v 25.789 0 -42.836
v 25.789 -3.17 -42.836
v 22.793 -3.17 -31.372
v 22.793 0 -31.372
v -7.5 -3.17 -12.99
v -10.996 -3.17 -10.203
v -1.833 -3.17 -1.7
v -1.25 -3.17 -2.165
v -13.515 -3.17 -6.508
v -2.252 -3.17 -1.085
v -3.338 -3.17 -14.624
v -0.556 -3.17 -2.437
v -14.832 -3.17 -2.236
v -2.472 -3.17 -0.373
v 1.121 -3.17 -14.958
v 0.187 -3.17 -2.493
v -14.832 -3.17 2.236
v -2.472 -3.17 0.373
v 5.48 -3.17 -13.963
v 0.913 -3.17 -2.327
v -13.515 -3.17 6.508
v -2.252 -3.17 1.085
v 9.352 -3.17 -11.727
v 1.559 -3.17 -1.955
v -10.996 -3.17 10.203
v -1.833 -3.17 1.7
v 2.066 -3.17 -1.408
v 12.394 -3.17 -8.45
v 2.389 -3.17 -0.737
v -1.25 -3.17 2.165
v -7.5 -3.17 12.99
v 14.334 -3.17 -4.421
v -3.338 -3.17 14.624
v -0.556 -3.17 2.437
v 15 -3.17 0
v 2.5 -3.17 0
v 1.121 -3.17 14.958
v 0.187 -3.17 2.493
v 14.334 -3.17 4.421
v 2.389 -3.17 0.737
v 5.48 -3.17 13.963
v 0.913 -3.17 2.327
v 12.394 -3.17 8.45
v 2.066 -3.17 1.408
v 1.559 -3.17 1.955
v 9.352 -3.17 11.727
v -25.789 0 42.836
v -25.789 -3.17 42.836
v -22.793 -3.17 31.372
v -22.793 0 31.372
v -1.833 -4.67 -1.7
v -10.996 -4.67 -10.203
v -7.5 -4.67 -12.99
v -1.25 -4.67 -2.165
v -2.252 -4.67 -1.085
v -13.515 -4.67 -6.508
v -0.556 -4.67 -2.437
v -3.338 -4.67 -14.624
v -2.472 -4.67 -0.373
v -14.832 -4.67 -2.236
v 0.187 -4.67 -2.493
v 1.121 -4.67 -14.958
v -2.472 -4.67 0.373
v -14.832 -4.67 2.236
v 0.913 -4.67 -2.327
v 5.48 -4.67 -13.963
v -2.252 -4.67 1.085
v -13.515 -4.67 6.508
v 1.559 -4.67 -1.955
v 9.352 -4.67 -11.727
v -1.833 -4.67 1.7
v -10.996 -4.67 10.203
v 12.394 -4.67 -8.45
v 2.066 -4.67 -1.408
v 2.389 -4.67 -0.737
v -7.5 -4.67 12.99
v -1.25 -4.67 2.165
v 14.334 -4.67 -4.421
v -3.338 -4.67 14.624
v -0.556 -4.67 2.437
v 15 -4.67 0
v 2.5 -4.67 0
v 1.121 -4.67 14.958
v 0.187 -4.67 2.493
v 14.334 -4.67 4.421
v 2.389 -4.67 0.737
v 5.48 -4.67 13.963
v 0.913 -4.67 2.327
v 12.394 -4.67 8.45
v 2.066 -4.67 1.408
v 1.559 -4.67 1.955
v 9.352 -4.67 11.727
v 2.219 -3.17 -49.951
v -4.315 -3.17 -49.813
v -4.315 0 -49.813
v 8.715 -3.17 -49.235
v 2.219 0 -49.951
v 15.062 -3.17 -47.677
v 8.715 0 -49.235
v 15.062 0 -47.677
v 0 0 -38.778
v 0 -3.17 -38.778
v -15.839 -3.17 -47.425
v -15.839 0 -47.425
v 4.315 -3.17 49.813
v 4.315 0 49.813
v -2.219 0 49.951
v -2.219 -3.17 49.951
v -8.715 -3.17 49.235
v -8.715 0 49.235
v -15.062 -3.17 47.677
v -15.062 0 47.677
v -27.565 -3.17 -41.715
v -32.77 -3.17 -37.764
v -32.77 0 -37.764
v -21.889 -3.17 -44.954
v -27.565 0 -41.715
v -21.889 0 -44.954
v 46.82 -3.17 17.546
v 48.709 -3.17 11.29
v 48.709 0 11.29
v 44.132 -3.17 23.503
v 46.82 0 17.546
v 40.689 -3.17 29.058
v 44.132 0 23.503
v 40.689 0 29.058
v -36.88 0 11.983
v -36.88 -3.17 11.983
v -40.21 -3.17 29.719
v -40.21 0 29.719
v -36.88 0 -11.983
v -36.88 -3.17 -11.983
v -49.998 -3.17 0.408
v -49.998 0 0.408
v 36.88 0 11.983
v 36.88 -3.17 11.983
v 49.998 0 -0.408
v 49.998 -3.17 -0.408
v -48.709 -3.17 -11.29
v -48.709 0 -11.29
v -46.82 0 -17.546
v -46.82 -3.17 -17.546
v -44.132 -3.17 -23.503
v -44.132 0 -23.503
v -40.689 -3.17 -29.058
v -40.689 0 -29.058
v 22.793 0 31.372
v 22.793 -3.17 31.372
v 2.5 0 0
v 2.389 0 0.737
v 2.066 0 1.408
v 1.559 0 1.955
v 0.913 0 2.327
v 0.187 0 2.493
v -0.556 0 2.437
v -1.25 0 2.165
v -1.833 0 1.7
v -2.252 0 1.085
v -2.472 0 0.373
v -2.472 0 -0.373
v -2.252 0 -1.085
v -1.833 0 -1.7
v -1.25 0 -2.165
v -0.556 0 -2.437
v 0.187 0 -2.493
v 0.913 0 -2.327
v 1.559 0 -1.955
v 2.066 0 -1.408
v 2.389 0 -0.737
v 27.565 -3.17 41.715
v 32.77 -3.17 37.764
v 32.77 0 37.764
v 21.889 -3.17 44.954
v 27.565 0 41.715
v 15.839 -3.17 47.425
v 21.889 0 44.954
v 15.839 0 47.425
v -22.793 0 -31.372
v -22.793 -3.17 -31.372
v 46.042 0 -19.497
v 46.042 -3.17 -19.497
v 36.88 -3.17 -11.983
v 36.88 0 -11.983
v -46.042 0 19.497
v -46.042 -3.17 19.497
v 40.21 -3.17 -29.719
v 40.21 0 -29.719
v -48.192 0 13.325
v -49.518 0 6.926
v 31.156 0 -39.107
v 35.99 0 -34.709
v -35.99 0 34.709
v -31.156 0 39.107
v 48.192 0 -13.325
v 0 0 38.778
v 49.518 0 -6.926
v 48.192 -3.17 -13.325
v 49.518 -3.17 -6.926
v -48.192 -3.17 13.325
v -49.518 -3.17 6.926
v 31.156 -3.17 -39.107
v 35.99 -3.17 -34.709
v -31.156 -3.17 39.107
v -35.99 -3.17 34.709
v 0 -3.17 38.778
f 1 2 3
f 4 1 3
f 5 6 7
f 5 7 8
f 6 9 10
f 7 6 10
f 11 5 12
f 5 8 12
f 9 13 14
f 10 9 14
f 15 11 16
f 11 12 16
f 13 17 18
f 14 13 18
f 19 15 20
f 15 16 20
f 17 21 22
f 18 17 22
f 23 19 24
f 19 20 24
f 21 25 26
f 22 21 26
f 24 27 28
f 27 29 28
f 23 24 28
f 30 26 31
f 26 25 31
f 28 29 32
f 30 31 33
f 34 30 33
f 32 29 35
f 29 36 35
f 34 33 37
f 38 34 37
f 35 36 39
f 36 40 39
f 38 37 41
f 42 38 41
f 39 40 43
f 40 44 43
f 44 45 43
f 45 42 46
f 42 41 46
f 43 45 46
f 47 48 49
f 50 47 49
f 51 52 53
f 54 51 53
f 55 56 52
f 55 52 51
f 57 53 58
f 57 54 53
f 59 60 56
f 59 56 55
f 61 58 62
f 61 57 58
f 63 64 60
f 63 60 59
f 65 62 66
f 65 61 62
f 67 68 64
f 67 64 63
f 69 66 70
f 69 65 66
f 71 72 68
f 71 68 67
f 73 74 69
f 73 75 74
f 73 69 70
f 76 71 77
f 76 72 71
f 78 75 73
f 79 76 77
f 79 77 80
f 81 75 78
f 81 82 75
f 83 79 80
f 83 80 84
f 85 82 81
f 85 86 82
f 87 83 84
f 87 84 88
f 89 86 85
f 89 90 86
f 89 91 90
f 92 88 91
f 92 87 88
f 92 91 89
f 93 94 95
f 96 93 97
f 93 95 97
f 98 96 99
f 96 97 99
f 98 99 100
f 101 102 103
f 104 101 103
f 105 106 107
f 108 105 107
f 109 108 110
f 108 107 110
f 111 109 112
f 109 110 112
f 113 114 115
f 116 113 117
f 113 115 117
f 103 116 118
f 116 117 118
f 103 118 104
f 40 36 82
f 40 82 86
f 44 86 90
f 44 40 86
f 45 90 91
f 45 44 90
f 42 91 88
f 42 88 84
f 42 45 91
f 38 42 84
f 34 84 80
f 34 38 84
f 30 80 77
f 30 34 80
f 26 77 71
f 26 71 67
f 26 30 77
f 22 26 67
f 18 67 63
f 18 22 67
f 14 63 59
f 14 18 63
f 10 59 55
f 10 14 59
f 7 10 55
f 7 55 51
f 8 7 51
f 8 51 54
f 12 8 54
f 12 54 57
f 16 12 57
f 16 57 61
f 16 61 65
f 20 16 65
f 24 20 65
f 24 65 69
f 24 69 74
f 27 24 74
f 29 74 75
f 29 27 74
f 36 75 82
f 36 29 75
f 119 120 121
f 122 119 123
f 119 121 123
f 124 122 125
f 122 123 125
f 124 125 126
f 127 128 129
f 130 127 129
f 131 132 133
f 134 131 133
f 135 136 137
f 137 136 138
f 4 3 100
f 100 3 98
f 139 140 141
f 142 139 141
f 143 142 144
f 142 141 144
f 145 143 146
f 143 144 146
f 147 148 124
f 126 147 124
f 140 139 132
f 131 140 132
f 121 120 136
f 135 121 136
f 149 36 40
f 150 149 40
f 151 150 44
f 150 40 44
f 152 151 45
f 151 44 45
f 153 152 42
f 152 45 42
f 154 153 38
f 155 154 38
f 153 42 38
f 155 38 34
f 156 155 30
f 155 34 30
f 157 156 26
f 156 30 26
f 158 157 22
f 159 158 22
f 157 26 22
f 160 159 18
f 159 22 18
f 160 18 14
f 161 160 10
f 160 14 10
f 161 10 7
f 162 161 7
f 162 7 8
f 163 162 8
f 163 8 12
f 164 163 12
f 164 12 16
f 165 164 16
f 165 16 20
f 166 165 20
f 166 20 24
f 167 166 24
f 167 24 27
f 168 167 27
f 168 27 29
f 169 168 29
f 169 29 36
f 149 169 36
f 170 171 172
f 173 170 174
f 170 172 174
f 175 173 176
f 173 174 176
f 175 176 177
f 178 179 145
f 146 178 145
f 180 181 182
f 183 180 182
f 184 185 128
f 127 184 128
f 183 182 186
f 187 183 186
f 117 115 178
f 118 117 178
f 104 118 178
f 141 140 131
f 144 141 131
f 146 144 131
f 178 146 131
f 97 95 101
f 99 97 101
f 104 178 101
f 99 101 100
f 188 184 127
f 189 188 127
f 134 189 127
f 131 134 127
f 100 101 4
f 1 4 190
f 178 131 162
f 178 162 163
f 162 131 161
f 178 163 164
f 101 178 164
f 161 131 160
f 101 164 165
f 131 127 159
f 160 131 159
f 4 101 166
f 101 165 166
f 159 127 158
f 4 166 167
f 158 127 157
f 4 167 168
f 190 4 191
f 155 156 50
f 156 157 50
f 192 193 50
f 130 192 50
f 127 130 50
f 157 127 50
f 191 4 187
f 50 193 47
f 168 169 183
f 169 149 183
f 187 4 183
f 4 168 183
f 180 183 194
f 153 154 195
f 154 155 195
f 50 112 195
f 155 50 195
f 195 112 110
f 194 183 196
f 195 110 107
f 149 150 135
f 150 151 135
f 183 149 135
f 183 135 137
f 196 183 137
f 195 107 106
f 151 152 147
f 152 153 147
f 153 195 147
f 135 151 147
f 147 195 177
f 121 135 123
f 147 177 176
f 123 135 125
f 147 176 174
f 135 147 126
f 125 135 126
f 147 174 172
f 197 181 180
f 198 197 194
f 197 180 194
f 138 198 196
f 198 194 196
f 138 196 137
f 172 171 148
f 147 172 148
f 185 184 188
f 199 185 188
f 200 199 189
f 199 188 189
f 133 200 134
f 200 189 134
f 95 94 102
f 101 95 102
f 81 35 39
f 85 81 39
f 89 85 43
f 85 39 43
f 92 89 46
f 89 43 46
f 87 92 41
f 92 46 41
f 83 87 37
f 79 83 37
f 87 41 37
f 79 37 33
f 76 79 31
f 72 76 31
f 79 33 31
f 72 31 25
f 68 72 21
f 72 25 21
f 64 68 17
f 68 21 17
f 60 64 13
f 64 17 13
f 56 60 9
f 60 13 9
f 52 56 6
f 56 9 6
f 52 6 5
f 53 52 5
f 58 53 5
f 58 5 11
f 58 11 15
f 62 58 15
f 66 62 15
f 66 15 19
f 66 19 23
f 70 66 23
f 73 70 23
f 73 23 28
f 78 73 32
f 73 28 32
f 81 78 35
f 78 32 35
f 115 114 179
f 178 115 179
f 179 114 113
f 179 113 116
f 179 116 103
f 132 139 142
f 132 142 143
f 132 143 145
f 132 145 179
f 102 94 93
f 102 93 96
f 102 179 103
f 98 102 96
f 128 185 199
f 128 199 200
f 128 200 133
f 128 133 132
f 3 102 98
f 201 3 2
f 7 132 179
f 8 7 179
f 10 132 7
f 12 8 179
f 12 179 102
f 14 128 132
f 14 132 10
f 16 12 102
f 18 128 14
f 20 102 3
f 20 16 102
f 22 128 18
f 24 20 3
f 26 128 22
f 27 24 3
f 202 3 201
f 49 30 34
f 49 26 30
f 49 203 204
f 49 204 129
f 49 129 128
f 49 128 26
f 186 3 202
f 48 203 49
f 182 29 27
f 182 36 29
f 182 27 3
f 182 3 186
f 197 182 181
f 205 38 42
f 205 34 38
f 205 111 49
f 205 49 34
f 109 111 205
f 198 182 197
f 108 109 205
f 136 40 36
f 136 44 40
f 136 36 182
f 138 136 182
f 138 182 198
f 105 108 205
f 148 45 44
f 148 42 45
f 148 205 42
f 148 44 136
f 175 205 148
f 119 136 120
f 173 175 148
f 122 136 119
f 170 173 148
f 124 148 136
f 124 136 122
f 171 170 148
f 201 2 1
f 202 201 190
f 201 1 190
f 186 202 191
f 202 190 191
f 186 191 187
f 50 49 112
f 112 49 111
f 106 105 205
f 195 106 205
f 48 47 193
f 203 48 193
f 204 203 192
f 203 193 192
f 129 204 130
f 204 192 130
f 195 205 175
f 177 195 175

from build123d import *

# Parameters (mm, degrees)
F0_R     = 50
F1_DEPTH = 3.17
F2_R     = 2.5
F3_DEPTH = 25
F4_R     = 15
F4_R_2   = 2.5
F5_DEPTH = 1.5
F7_DEPTH = 25


with BuildPart() as f1:
    # F0 (on Front) → F1 (new body)
    with BuildSketch(Plane.XZ):
        Circle(F0_R)
    extrude(amount=F1_DEPTH)

    # F2 (on face) → F3 (cut)
    with BuildSketch(Plane.XZ.offset(3.17)):
        Circle(F2_R)
    extrude(amount=-F3_DEPTH, mode=Mode.SUBTRACT)

    # F6 (on face) → F7 (cut)
    with BuildSketch(Plane.XZ.offset(3.17)):
        with BuildLine():
            Line((-22.7931910082, 31.3721360136), (-15.0621287485, 47.6773769996))
            ThreePointArc((-15.0621287485, 47.6773769996), (-20.5685569707, 45.5733964517), (-25.7891029355, 42.8359915233))
            Line((-25.7891029355, 42.8359915233), (-22.7931910082, 31.3721360136))
        make_face()
        with BuildLine():
            Line((0, 38.7780927122), (15.8385409393, 47.4251053864))
            ThreePointArc((15.8385409393, 47.4251053864), (10.1470581921, 48.9595466691), (4.3145415402, 49.8134994886))
            Line((4.3145415402, 49.8134994886), (0, 38.7780927122))
        make_face()
        with BuildLine():
            ThreePointArc((40.6894263206, 29.0580554357), (36.9868420114, 33.6448141327), (32.7701777935, 37.7639437478))
            Line((32.7701777935, 37.7639437478), (22.7931910082, 31.3721360136))
            Line((22.7931910082, 31.3721360136), (40.6894263206, 29.0580554357))
        make_face()
        with BuildLine():
            ThreePointArc((50, 0), (49.6761310759, 5.6817252069), (48.7087199469, 11.2898450446))
            Line((48.7087199469, 11.2898450446), (36.8801577634, 11.9830896575))
            Line((36.8801577634, 11.9830896575), (49.9983338301, -0.4081840445))
            ThreePointArc((49.9983338301, -0.4081840445), (49.9995834558, -0.2040937225), (50, 0))
        make_face()
        with BuildLine():
            ThreePointArc((40.2095771974, -29.7185110934), (43.4276824703, -24.7797577725), (46.0421866292, -19.4965907379))
            Line((46.0421866292, -19.4965907379), (36.8801577634, -11.9830896575))
            Line((36.8801577634, -11.9830896575), (40.2095771974, -29.7185110934))
        make_face()
        with BuildLine():
            ThreePointArc((15.0621287485, -47.6773769996), (20.5685569707, -45.5733964517), (25.7891029355, -42.8359915233))
            Line((25.7891029355, -42.8359915233), (22.7931910082, -31.3721360136))
            Line((22.7931910082, -31.3721360136), (15.0621287485, -47.6773769996))
        make_face()
        with BuildLine():
            ThreePointArc((-15.8385409393, -47.4251053864), (-10.1470581921, -48.9595466691), (-4.3145415402, -49.8134994886))
            Line((-4.3145415402, -49.8134994886), (0, -38.7780927122))
            Line((0, -38.7780927122), (-15.8385409393, -47.4251053864))
        make_face()
        with BuildLine():
            Line((-22.7931910082, -31.3721360136), (-40.6894263206, -29.0580554357))
            ThreePointArc((-40.6894263206, -29.0580554357), (-36.9868420114, -33.6448141327), (-32.7701777935, -37.7639437478))
            Line((-32.7701777935, -37.7639437478), (-22.7931910082, -31.3721360136))
        make_face()
        with BuildLine():
            Line((-36.8801577634, -11.9830896575), (-49.9983338301, 0.4081840445))
            ThreePointArc((-49.9983338301, 0.4081840445), (-49.6989093188, -5.4789061428), (-48.7087199469, -11.2898450446))
            Line((-48.7087199469, -11.2898450446), (-36.8801577634, -11.9830896575))
        make_face()
        with BuildLine():
            Line((-36.8801577634, 11.9830896575), (-40.2095771974, 29.7185110934))
            ThreePointArc((-40.2095771974, 29.7185110934), (-43.4276824703, 24.7797577725), (-46.0421866292, 19.4965907379))
            Line((-46.0421866292, 19.4965907379), (-36.8801577634, 11.9830896575))
        make_face()
    extrude(amount=-F7_DEPTH, mode=Mode.SUBTRACT)


with BuildPart() as f5:
    # F4 (on face) → F5 (new body)
    with BuildSketch(Plane.XZ.offset(3.17)):
        Circle(F4_R)
        Circle(F4_R_2, mode=Mode.SUBTRACT)
    extrude(amount=F5_DEPTH)


solid = Compound([f1.part, f5.part])
